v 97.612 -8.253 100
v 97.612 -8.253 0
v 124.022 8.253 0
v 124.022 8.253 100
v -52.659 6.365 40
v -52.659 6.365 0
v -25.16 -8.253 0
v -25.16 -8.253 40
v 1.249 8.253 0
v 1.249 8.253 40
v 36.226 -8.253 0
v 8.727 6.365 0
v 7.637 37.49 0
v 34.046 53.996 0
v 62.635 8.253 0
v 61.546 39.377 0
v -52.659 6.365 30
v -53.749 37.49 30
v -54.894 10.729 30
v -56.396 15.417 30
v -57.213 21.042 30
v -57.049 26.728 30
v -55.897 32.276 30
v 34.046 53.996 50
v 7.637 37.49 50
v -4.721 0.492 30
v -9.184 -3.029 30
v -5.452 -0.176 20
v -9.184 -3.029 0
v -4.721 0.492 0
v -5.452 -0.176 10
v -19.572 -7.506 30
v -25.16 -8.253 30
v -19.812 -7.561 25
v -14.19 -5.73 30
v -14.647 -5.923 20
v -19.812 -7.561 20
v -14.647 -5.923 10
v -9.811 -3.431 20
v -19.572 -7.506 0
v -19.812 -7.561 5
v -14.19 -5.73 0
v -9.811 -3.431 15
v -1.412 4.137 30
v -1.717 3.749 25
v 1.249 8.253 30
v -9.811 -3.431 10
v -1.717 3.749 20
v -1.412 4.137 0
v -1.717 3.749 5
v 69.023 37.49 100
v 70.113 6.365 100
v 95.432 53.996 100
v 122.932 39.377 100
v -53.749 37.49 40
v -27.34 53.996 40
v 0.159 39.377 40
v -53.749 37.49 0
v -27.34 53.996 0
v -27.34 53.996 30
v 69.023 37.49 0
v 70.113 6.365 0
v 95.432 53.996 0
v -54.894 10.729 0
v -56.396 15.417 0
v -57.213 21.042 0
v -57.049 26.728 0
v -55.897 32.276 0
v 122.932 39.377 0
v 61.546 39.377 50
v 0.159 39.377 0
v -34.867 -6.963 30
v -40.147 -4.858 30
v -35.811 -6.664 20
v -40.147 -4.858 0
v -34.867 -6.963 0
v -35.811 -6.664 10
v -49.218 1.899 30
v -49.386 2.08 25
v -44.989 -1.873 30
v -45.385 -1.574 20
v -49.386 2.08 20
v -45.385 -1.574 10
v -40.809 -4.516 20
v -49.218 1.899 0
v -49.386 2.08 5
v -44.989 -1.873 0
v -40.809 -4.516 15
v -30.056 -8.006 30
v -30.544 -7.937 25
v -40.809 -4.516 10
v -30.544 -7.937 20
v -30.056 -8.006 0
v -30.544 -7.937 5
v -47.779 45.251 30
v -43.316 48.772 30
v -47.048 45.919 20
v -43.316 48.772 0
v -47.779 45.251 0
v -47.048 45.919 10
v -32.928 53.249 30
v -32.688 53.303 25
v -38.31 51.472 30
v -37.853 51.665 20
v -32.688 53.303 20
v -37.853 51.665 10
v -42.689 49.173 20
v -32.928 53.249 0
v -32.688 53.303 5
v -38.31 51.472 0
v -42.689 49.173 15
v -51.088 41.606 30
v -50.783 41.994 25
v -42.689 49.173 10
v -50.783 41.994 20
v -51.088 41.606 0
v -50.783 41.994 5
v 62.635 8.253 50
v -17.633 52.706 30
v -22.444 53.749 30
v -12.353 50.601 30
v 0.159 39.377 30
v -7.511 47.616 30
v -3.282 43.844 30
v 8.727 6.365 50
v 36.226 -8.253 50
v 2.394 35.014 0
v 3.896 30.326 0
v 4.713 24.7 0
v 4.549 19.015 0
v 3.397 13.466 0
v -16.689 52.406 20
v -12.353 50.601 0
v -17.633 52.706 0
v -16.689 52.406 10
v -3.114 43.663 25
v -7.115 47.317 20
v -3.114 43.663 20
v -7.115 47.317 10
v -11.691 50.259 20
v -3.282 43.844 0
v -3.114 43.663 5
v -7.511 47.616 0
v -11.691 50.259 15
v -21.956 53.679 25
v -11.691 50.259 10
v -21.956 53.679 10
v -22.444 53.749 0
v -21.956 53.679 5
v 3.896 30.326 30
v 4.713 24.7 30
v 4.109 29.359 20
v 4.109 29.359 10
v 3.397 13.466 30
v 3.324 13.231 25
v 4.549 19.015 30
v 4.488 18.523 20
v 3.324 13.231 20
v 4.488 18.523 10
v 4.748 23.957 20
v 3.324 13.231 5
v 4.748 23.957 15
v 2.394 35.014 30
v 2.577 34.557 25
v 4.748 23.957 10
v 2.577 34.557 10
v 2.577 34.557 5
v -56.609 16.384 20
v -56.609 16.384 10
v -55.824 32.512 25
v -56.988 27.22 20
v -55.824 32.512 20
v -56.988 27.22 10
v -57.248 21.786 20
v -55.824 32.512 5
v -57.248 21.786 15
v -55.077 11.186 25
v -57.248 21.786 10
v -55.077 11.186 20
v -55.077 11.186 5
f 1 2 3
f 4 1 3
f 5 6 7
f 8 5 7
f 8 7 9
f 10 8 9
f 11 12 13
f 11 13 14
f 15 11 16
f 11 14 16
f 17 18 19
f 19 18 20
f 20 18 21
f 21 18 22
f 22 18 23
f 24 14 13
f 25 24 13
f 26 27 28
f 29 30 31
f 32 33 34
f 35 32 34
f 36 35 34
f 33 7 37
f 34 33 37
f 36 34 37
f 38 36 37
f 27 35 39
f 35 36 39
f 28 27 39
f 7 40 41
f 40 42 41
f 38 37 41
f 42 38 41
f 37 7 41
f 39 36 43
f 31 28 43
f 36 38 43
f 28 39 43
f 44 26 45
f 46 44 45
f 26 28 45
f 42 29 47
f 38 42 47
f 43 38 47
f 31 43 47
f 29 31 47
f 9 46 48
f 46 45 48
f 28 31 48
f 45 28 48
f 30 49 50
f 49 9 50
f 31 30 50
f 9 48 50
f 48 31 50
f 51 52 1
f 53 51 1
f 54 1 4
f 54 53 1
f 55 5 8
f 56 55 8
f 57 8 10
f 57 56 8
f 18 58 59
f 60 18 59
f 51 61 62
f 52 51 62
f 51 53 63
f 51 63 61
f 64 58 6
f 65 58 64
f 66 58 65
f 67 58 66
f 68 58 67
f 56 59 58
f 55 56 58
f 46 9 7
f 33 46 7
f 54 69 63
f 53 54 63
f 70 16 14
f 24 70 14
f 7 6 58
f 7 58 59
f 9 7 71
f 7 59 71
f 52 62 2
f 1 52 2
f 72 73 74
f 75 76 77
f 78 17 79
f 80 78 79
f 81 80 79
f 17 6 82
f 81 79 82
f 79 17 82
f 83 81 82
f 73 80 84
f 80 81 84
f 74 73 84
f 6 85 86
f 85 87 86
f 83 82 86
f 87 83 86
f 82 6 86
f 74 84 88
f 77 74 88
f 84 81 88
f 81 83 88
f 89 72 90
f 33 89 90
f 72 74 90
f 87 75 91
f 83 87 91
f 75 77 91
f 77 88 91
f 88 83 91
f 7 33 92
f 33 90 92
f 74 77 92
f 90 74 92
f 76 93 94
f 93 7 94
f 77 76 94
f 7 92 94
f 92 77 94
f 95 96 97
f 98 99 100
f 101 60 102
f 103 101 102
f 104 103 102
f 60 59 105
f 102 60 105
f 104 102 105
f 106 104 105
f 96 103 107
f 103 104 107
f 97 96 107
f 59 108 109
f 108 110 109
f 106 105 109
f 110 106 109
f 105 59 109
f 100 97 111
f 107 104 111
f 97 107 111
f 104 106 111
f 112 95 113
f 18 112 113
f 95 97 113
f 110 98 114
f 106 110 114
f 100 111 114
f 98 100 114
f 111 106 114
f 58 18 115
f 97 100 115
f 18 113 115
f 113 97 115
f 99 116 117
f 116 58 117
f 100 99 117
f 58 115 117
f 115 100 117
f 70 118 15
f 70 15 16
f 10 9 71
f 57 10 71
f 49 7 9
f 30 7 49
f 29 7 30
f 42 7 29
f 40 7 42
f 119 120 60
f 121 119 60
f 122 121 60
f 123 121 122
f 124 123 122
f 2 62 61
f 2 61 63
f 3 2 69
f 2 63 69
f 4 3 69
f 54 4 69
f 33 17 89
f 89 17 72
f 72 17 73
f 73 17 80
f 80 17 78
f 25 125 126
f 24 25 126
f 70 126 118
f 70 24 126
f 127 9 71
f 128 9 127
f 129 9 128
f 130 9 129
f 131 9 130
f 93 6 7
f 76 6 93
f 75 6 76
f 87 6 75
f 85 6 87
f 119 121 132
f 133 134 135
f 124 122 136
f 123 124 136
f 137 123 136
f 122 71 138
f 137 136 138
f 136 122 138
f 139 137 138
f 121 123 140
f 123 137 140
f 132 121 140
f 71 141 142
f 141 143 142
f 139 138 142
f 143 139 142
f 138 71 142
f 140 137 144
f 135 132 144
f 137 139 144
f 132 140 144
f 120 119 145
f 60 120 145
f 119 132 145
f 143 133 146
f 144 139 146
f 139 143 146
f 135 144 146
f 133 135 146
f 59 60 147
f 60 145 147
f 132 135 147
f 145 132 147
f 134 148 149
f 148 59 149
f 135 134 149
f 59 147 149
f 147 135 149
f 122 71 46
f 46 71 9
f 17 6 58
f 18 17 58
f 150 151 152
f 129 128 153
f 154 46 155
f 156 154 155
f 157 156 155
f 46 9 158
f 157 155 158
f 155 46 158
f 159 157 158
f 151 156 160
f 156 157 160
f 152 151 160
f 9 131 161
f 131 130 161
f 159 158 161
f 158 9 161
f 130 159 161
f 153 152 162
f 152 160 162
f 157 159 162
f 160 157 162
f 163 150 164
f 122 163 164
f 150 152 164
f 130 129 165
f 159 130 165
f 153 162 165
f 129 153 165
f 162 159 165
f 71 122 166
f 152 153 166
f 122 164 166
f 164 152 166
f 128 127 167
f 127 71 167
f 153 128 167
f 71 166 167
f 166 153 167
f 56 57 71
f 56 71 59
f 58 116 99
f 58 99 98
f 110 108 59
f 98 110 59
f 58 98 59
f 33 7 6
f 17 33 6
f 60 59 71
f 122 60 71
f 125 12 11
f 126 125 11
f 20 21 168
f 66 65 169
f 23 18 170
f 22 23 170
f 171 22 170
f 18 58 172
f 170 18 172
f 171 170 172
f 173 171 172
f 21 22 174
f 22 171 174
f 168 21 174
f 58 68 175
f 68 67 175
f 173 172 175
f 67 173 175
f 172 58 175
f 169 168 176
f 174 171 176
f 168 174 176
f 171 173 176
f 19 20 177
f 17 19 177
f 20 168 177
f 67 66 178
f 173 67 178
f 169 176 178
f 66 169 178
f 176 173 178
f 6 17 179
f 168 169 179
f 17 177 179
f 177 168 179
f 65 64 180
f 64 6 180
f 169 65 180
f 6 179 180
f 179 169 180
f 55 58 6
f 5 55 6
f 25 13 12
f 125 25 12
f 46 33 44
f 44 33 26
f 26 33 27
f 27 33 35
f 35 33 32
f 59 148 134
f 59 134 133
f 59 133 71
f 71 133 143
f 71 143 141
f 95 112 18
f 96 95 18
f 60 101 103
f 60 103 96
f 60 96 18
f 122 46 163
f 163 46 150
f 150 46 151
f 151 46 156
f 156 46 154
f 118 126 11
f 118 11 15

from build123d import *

# Parameters (mm, degrees)
F1_DEPTH = 30
F2_DEPTH = 40
F3_DEPTH = 50
F4_DEPTH = 100


with BuildPart() as f1:
    # F0 (on Top) → F1 (new body)
    with BuildSketch(Plane.XY):
        with BuildLine():
            add(Edge.make_bspline(
                [(-53.7493015469, 37.4896133902), (-58.8132375206, 27.9635762611), (-58.3773133936, 15.5138743345), (-52.6594912293, 6.3653585736)],
                knots=[0.6666666667, 0.6666666667, 0.6666666667, 0.6666666667, 0.8333333333, 0.8333333333, 0.8333333333, 0.8333333333], degree=3))
            Line((-52.6594912293, 6.3653585736), (-53.7493015469, 37.4896133902))
        make_face()
    extrude(amount=F1_DEPTH)


with BuildPart() as f1b:
    # F0 (on Top) → F1, piece 2 (new body)
    with BuildSketch(Plane.XY):
        with BuildLine():
            Line((-53.7493015469, 37.4896133902), (-27.3398113607, 53.9955442188))
            add(Edge.make_bspline(
                [(-27.3398113607, 53.9955442188), (-38.1215694987, 53.6180228507), (-48.6853655732, 47.0156505192), (-53.7493015469, 37.4896133902)],
                knots=[0.5, 0.5, 0.5, 0.5, 0.6666666667, 0.6666666667, 0.6666666667, 0.6666666667], degree=3))
        make_face()
    extrude(amount=F1_DEPTH)


with BuildPart() as f1c:
    # F0 (on Top) → F1, piece 3 (new body)
    with BuildSketch(Plane.XY):
        with BuildLine():
            Line((-27.3398113607, 53.9955442188), (0.1594891431, 39.3772202309))
            add(Edge.make_bspline(
                [(0.1594891431, 39.3772202309), (-5.5583330212, 48.5257359918), (-16.5580532227, 54.373065587), (-27.3398113607, 53.9955442188)],
                knots=[0.3333333333, 0.3333333333, 0.3333333333, 0.3333333333, 0.5, 0.5, 0.5, 0.5], degree=3))
        make_face()
    extrude(amount=F1_DEPTH)


with BuildPart() as f1d:
    # F0 (on Top) → F1, piece 4 (new body)
    with BuildSketch(Plane.XY):
        with BuildLine():
            Line((0.1594891431, 39.3772202309), (1.2492994608, 8.2529654143))
            add(Edge.make_bspline(
                [(1.2492994608, 8.2529654143), (6.3132354345, 17.7790025434), (5.8773113074, 30.22870447), (0.1594891431, 39.3772202309)],
                knots=[0.1666666667, 0.1666666667, 0.1666666667, 0.1666666667, 0.3333333333, 0.3333333333, 0.3333333333, 0.3333333333], degree=3))
        make_face()
    extrude(amount=F1_DEPTH)


with BuildPart() as f1e:
    # F0 (on Top) → F1, piece 5 (new body)
    with BuildSketch(Plane.XY):
        with BuildLine():
            add(Edge.make_bspline(
                [(-25.1601907254, -8.2529654143), (-14.3784325874, -7.8754440462), (-3.8146365129, -1.2730717147), (1.2492994608, 8.2529654143)],
                knots=[0, 0, 0, 0, 0.1666666667, 0.1666666667, 0.1666666667, 0.1666666667], degree=3))
            Line((1.2492994608, 8.2529654143), (-25.1601907254, -8.2529654143))
        make_face()
    extrude(amount=F1_DEPTH)


with BuildPart() as f1f:
    # F0 (on Top) → F1, piece 6 (new body)
    with BuildSketch(Plane.XY):
        with BuildLine():
            add(Edge.make_bspline(
                [(-52.6594912293, 6.3653585736), (-46.941669065, -2.7831571873), (-35.9419488634, -8.6304867825), (-25.1601907254, -8.2529654143)],
                knots=[0.8333333333, 0.8333333333, 0.8333333333, 0.8333333333, 1, 1, 1, 1], degree=3))
            Line((-25.1601907254, -8.2529654143), (-52.6594912293, 6.3653585736))
        make_face()
    extrude(amount=F1_DEPTH)


with BuildPart() as f2:
    # F0 (on Top) → F2 (new body)
    with BuildSketch(Plane.XY):
        Polygon((-25.1601907254, -8.2529654143), (1.2492994608, 8.2529654143), (0.1594891431, 39.3772202309), (-27.3398113607, 53.9955442188), (-53.7493015469, 37.4896133902), (-52.6594912293, 6.3653585736), align=None)
    extrude(amount=F2_DEPTH)


with BuildPart() as f3:
    # F0 (on Top) → F3 (new body)
    with BuildSketch(Plane.XY):
        Polygon((61.5456291431, 39.3772202309), (34.0463286393, 53.9955442188), (7.6368384531, 37.4896133902), (8.7266487707, 6.3653585736), (36.2259492746, -8.2529654143), (62.6354394608, 8.2529654143), align=None)
    extrude(amount=F3_DEPTH)


with BuildPart() as f4:
    # F0 (on Top) → F4 (new body)
    with BuildSketch(Plane.XY):
        Polygon((122.9317691431, 39.3772202309), (95.4324686393, 53.9955442188), (69.0229784531, 37.4896133902), (70.1127887707, 6.3653585736), (97.6120892746, -8.2529654143), (124.0215794608, 8.2529654143), align=None)
    extrude(amount=F4_DEPTH)


solid = Compound([f1.part, f1b.part, f1c.part, f1d.part, f1e.part, f1f.part, f2.part, f3.part, f4.part])
